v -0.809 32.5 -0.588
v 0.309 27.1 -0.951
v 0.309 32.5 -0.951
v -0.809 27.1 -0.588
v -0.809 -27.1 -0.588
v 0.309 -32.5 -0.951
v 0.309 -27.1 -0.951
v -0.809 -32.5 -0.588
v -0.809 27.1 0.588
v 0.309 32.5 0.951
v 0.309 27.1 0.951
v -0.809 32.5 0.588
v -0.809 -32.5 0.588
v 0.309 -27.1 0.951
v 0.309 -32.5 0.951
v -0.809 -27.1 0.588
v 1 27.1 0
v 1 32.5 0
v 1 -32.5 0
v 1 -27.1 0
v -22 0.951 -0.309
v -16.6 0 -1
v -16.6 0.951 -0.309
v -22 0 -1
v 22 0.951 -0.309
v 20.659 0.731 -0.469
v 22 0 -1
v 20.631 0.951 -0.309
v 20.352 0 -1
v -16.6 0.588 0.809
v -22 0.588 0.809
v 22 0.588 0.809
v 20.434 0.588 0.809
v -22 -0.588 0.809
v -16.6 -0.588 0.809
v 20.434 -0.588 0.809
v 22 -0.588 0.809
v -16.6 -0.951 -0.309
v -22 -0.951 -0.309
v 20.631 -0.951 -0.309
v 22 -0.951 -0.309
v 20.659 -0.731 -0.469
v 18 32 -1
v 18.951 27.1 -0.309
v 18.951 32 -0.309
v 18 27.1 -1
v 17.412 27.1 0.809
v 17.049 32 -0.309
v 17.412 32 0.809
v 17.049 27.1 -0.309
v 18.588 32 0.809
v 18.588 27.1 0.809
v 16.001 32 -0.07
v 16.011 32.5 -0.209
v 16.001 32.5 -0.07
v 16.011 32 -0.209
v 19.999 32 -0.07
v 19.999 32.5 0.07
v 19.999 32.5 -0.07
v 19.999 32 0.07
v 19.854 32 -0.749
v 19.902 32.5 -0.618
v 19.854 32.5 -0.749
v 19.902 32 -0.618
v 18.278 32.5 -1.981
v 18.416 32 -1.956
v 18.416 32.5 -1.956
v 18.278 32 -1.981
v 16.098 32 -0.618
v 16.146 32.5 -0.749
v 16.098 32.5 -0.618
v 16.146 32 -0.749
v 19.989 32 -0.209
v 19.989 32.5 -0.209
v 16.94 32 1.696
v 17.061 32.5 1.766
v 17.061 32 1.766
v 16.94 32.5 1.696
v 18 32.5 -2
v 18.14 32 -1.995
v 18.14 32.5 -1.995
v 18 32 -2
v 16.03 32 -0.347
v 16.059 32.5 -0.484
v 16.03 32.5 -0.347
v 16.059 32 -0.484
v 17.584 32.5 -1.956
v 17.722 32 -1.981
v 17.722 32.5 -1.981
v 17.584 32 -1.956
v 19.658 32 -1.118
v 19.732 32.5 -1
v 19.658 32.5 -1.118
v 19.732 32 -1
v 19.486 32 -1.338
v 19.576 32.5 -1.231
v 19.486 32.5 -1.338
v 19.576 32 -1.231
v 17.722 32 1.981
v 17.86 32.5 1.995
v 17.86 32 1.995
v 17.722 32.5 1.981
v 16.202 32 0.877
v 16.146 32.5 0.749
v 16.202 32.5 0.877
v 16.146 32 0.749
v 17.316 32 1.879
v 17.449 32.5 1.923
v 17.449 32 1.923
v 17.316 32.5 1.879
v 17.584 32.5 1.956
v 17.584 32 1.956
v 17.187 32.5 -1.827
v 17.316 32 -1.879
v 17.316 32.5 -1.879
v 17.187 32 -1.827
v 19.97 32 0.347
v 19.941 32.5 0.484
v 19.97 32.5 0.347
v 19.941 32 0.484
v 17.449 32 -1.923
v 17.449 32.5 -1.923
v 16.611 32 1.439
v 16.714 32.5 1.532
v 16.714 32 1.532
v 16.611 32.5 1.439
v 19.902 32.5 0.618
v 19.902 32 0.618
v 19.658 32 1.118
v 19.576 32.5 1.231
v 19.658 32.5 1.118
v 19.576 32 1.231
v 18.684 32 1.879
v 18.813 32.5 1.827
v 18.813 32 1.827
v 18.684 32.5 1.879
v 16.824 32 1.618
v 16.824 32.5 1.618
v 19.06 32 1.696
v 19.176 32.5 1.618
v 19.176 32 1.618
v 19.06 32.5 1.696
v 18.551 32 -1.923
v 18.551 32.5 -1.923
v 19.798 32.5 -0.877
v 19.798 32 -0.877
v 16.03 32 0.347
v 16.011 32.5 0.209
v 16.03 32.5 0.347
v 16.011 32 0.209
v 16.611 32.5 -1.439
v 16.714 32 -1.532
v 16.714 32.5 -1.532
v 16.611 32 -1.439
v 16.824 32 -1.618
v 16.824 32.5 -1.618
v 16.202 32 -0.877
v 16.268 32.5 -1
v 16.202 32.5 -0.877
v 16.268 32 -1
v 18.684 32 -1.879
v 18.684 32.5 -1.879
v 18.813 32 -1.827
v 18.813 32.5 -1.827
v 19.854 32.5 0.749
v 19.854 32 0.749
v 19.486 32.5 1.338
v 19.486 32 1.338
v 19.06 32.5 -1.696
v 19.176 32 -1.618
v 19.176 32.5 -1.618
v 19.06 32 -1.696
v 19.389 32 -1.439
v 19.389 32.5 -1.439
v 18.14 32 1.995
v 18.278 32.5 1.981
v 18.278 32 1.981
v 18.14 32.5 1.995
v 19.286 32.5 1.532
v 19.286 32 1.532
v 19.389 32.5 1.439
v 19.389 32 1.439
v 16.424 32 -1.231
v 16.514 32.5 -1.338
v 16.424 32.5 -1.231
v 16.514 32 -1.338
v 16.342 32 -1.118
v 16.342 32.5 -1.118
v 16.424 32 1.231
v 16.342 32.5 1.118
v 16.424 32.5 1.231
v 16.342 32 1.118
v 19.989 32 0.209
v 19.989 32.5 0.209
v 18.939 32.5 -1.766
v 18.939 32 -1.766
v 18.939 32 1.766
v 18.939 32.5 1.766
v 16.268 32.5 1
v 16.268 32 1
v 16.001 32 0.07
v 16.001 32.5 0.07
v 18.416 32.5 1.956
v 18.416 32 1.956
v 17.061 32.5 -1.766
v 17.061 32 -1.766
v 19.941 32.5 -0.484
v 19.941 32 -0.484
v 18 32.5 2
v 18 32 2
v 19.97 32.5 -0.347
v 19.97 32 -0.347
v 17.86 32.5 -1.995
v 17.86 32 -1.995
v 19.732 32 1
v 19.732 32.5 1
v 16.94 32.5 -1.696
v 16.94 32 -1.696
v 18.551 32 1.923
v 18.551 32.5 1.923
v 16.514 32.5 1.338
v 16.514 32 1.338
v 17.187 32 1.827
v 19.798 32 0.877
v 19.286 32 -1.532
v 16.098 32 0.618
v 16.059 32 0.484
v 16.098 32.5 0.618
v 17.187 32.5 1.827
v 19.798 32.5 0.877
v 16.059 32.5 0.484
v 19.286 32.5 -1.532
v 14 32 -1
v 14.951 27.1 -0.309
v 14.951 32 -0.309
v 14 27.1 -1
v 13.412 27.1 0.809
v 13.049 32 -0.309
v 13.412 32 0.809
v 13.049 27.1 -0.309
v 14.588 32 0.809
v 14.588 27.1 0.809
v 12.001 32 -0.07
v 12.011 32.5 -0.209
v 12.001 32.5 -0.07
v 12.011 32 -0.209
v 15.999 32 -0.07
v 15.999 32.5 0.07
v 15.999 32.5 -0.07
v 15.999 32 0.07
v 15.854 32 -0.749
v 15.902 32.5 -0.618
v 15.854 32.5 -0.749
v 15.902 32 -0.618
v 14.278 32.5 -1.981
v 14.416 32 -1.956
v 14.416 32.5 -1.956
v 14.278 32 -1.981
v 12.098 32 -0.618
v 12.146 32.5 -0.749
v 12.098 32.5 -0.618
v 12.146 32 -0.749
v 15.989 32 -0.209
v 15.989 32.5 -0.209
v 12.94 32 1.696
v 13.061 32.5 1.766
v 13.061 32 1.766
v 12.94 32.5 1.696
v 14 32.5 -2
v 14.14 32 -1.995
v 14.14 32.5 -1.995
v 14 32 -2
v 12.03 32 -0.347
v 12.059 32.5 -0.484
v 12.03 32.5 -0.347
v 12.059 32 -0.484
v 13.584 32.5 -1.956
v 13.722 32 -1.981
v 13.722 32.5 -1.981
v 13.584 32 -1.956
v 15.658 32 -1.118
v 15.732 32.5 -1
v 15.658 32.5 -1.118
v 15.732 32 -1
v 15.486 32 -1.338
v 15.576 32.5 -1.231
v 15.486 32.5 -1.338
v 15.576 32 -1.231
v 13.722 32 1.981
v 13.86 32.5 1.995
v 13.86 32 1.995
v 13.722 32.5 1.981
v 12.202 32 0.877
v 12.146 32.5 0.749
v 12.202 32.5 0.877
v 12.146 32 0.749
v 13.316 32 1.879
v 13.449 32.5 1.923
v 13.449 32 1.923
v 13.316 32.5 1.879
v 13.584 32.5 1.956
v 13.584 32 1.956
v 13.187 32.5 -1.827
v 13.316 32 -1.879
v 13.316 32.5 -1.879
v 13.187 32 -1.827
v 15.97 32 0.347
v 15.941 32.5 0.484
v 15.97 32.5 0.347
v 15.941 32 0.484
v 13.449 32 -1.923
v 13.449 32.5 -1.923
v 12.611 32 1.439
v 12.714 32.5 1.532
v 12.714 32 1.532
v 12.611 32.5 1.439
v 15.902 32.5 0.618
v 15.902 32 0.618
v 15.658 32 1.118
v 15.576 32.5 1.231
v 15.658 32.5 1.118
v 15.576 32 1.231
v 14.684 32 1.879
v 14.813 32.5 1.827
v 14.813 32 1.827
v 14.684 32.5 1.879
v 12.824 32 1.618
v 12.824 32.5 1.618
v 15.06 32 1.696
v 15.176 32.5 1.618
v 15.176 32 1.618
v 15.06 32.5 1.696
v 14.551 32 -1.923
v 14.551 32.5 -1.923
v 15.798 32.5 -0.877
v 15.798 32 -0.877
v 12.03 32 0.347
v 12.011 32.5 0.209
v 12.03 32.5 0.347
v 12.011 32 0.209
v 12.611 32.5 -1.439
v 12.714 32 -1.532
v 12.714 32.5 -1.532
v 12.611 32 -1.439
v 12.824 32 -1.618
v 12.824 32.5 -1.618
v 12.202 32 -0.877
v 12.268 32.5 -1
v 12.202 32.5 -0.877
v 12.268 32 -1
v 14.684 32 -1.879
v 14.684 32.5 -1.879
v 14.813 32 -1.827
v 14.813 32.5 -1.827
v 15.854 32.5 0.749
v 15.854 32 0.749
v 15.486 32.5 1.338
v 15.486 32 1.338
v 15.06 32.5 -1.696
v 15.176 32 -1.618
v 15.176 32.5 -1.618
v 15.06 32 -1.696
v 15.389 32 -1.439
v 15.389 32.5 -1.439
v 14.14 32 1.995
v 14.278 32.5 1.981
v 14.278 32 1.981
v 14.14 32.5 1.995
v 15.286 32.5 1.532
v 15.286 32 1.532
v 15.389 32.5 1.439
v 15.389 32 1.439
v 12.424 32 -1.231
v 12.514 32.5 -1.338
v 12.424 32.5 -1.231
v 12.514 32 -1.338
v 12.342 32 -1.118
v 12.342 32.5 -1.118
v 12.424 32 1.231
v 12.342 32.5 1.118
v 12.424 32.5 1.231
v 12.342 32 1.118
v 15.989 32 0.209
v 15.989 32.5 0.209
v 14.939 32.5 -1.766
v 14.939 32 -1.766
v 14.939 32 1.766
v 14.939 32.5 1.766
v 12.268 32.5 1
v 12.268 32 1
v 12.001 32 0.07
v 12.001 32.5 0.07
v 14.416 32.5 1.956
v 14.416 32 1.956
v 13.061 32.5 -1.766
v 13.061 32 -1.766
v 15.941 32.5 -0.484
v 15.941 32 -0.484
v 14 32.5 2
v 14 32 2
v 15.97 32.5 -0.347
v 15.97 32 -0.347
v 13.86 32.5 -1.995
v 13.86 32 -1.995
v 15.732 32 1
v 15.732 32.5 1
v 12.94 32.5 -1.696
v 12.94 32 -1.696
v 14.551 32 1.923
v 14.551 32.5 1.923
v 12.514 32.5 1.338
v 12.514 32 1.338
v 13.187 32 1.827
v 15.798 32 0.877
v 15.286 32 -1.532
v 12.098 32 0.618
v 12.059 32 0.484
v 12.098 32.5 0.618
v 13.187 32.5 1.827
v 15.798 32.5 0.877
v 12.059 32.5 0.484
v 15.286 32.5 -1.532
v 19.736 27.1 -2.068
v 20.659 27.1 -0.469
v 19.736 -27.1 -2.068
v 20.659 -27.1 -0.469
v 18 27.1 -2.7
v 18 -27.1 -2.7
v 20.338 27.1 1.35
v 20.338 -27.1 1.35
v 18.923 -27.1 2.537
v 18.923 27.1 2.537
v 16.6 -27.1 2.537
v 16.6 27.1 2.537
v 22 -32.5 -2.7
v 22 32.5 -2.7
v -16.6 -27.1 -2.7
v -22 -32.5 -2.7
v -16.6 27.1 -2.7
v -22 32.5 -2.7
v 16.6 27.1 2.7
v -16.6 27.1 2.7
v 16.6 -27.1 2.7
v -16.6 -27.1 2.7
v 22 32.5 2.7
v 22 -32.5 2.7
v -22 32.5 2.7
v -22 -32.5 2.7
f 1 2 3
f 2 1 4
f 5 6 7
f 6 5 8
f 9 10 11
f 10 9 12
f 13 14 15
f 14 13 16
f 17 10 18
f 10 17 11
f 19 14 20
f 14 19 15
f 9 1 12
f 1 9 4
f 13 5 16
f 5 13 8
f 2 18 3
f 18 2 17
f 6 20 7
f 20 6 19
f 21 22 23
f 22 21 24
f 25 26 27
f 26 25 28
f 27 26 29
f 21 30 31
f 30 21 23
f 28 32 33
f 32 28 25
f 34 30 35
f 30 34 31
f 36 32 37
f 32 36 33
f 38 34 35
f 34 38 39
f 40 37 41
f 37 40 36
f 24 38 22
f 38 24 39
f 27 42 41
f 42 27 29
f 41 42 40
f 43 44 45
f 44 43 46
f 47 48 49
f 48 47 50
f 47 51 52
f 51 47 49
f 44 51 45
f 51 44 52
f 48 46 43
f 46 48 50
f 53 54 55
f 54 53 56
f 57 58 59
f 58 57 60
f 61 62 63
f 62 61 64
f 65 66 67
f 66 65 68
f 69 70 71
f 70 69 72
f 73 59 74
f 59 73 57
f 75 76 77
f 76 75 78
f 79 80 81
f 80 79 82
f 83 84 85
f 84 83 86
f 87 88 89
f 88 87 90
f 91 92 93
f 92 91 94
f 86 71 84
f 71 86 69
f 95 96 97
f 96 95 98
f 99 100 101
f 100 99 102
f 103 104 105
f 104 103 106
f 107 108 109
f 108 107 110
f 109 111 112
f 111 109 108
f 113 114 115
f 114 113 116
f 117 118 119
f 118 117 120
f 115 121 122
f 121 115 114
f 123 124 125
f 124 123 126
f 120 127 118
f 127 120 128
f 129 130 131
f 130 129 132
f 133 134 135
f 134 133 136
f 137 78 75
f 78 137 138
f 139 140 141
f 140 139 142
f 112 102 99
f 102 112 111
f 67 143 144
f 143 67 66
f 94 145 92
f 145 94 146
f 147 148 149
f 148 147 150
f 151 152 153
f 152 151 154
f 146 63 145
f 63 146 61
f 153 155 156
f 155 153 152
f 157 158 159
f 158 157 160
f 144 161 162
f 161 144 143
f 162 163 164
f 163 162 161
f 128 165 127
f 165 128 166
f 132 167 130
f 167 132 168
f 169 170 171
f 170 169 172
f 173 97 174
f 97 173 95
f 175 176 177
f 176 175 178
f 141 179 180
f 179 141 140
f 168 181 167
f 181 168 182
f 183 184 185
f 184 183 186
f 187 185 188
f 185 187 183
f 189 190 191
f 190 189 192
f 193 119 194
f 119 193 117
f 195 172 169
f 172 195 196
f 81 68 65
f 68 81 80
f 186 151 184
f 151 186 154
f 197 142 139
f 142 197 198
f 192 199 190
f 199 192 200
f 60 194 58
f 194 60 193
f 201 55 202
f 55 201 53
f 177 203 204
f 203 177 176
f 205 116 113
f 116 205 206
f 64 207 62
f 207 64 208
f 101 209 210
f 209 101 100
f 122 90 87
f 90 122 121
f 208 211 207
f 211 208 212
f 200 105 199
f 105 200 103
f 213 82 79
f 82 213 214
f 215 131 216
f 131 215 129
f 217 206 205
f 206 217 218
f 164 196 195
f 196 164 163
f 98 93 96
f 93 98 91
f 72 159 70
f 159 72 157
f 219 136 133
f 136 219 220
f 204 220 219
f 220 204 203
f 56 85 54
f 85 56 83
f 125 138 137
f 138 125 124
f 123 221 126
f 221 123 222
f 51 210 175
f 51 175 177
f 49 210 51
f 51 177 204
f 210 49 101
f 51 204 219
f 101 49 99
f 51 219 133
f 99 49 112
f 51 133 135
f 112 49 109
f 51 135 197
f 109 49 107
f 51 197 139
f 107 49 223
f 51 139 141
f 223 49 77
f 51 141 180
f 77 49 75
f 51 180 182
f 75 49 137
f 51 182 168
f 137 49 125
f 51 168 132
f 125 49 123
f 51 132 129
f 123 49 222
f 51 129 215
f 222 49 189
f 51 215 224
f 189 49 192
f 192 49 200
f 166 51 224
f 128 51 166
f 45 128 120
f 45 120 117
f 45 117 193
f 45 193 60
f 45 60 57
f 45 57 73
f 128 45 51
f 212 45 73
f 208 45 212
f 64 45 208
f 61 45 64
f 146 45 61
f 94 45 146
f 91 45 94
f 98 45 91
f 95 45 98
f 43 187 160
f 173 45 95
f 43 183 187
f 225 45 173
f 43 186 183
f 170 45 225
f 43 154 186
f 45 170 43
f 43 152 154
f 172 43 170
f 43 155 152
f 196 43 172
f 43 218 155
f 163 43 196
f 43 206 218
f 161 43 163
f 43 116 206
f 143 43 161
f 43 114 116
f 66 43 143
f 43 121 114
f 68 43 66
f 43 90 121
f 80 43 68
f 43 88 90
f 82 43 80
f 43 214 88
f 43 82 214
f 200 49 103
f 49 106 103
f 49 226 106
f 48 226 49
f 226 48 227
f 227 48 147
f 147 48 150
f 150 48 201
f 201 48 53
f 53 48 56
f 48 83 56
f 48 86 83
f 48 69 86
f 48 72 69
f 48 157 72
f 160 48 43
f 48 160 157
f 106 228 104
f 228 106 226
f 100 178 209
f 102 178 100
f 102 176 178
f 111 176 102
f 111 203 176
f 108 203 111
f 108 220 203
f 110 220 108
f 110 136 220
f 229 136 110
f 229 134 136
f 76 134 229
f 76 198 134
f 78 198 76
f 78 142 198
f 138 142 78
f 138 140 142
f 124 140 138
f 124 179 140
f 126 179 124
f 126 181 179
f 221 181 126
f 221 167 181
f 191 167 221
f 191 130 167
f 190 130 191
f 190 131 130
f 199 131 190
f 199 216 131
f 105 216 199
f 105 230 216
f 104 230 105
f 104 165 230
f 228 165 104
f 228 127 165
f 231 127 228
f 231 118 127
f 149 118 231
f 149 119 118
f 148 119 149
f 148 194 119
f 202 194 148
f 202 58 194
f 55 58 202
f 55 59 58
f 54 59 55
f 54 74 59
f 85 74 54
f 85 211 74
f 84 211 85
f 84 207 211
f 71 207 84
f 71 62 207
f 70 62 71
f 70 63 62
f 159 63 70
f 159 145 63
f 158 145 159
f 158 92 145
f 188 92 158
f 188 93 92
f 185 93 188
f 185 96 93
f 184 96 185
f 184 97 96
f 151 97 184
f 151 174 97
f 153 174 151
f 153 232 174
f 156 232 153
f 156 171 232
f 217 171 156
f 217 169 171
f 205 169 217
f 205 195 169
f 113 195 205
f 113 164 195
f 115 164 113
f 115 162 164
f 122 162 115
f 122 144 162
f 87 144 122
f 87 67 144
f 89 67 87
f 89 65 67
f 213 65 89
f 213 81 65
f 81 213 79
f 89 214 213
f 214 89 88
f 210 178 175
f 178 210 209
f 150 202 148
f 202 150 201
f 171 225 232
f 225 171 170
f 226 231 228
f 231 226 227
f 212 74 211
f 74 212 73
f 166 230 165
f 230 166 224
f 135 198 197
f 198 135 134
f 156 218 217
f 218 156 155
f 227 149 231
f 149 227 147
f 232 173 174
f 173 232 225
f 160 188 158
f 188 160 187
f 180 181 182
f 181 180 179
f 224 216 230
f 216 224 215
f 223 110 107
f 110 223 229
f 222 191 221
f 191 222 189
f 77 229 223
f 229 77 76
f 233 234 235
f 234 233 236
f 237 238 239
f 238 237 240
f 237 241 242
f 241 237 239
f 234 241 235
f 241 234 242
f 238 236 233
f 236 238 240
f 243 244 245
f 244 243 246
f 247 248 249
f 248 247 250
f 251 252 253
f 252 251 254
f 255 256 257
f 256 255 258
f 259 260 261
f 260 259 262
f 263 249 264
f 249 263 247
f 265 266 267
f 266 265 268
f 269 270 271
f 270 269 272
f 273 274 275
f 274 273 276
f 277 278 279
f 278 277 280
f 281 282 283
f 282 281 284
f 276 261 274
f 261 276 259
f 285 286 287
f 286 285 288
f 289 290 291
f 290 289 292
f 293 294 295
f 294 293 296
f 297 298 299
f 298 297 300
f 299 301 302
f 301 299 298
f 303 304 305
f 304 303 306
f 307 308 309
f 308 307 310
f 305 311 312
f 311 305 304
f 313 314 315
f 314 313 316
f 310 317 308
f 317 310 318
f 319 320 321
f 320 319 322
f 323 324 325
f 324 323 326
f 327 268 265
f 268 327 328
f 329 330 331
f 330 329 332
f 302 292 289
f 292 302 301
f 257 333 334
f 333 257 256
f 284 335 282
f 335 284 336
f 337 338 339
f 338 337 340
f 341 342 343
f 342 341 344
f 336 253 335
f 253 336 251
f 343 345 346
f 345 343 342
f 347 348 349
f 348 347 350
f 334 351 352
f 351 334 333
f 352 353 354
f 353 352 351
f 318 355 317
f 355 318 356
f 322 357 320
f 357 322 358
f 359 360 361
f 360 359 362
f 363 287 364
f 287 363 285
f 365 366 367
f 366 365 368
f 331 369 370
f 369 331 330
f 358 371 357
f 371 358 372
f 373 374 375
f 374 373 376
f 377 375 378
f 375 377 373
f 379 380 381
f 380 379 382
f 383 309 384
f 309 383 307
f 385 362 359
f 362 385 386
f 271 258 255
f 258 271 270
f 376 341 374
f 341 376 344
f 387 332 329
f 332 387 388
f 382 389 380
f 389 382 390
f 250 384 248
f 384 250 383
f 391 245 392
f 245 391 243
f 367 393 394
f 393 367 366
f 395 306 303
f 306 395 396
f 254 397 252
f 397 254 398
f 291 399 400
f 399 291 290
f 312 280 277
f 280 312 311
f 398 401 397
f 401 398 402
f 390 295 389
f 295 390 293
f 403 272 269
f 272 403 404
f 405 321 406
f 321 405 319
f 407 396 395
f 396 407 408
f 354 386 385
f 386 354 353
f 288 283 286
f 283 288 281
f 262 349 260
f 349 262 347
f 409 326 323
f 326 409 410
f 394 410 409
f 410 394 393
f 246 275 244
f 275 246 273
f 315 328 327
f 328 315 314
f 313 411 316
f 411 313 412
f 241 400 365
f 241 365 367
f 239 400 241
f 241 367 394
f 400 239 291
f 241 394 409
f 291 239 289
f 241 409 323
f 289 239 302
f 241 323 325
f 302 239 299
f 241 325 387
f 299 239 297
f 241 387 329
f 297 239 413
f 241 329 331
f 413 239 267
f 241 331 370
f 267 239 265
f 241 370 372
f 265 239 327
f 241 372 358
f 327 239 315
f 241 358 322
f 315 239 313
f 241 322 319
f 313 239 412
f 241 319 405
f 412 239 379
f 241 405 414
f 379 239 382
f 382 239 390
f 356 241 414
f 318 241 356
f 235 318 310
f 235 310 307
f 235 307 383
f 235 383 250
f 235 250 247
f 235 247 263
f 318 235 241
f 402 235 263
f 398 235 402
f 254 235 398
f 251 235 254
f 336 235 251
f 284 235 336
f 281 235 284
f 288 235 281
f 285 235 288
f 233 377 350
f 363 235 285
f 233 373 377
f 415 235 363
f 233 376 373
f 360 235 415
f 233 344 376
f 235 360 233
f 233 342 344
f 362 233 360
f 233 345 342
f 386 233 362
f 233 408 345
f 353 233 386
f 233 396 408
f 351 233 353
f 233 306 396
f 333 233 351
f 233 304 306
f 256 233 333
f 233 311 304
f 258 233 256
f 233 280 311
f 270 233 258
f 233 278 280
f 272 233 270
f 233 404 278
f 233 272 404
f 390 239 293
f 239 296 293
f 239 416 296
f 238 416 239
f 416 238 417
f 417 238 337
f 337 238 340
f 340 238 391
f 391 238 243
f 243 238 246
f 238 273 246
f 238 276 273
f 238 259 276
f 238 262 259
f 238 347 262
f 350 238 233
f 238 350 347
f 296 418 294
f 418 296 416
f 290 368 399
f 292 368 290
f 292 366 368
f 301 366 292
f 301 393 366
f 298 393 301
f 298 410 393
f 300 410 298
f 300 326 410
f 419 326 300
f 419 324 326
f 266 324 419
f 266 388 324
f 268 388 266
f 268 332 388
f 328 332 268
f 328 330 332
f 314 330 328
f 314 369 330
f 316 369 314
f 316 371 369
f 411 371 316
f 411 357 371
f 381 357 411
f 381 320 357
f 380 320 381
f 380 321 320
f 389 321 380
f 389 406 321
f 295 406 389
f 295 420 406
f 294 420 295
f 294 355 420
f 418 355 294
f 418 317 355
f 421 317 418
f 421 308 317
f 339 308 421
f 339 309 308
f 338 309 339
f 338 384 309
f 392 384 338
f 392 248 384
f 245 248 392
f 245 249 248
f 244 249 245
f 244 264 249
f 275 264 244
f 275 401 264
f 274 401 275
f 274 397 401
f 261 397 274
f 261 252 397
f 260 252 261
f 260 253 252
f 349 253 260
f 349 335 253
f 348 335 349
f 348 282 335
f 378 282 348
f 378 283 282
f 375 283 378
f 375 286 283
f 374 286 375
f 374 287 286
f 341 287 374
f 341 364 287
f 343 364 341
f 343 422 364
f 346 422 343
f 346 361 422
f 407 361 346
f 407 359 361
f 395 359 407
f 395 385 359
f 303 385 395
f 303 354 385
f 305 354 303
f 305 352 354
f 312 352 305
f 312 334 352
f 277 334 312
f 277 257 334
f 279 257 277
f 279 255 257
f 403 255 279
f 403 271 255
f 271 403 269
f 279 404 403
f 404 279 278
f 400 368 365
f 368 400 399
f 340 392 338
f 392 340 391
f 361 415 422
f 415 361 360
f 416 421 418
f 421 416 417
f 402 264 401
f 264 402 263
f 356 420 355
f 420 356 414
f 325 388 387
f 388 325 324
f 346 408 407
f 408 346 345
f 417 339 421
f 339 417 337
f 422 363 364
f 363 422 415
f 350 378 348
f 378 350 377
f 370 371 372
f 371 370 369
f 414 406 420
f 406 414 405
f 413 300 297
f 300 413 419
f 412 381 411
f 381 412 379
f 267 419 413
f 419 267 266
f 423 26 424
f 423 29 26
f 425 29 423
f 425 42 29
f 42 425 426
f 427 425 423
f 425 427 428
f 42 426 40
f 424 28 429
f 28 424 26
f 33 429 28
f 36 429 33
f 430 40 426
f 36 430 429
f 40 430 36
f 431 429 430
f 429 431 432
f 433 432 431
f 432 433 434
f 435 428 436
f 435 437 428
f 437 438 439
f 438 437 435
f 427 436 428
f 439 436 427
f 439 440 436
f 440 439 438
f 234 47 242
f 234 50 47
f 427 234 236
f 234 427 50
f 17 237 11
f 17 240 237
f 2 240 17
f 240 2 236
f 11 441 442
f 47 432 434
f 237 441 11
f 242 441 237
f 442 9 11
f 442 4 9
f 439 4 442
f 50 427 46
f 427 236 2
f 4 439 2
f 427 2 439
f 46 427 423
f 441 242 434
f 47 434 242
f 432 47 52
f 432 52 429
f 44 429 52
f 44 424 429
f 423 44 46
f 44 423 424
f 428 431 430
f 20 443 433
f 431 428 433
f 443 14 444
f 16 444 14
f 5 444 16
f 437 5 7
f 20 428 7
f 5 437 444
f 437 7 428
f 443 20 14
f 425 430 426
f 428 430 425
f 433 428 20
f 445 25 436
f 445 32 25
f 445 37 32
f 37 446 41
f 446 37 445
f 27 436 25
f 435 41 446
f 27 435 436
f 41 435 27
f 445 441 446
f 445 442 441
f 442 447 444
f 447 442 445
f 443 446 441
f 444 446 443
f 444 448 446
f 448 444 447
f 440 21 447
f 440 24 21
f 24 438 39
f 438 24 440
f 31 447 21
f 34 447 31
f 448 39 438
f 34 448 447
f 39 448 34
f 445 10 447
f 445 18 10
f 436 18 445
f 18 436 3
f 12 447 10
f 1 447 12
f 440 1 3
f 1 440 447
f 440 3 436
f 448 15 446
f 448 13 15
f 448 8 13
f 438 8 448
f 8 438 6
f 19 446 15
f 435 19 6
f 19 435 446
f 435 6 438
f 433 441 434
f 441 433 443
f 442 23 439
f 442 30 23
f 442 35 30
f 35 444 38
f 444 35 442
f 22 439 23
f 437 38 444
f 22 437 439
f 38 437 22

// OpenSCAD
// [FL_INDEX: keywords="openscad, 3d_parametric, Parametric_Power_Adapter_via_Battery_Contacts, csg_solid" | COT="Parametric OpenSCAD design from 3DCodeverse"]
// Title: Parametric Power Adapter via Battery Contacts

// Parametric Battery Power Supply
// Designed by Mike Creuzer thingiverse@creuzer.com 20130308




// The Width of the side that the contacts go on
BatteryWidth = 44;
// This very well may be the shorter side...
BatteryLength = 65;
// How thick the battery is
BatteryThickness = 5.4;

// How wide the nail shaft being used for the contact point is
PinThickness = 2;
// How wide the nail head being used for the contact point is
PinHeadThickness = 4;
// How thick the head of the nail being used for the contact point is
PinHeadDepth = .5;

// Center of pin to edge of battery block
Pin1DistanceFromEdge = 4;
// Center of pin to edge of battery block
Pin2DistanceFromEdge = 8;

// Size of hole to allow wire through the side of the battery
WireWidth = 2;
//WireDistanceFromEdge = 6;



// Build the box
difference()
{
	cube(size = [BatteryWidth, BatteryLength, BatteryThickness], center=true);
	cube(size = [BatteryWidth - BatteryThickness * 2, BatteryLength - BatteryThickness * 2, BatteryThickness + 1], center=true);
	WireHarness();
	InterfaceConnection();
}



module InterfaceConnection()
{
		translate([BatteryWidth * .5 - Pin1DistanceFromEdge, BatteryLength * .5,  0]) Pin();
		translate([BatteryWidth * .5 - Pin2DistanceFromEdge, BatteryLength * .5,  0]) Pin();
		
		hull() // Make sure this is room to solder the wires.
		{
			translate([BatteryWidth * .5 - Pin1DistanceFromEdge, BatteryLength * .5,  0]) PinElbowRoom();
			translate([BatteryWidth * .5 - Pin2DistanceFromEdge, BatteryLength * .5,  0]) PinElbowRoom();
		}
}


module Pin()
{
	translate([0, - (PinHeadDepth + BatteryThickness) * .5,  0]) union()
	{
	rotate([90,90,0]) cylinder(r = PinThickness * .5, h=BatteryThickness, center=true);
	translate([0, BatteryThickness * .5,  0]) rotate([90,90,0]) cylinder(r = PinHeadThickness * .5, h=PinHeadDepth, $fn=90, center=true);
	}
}

module PinElbowRoom()
{
	translate([0, - (BatteryLength- BatteryThickness) * .5,  0]) union()
	{
		translate([0, - BatteryThickness * .5,  0]) rotate([90,90,0]) cylinder(r = BatteryThickness * .5, h=BatteryLength - (2 * BatteryThickness ), center=true);
	}
}

module WireHarness()
{
	union() {
		rotate([90,0,0]) cylinder(r = WireWidth * .5, h=BatteryWidth + BatteryLength, center=true);
		rotate([0,90,0]) cylinder(r = WireWidth * .5, h=BatteryWidth + BatteryLength, center=true);
	}
}
